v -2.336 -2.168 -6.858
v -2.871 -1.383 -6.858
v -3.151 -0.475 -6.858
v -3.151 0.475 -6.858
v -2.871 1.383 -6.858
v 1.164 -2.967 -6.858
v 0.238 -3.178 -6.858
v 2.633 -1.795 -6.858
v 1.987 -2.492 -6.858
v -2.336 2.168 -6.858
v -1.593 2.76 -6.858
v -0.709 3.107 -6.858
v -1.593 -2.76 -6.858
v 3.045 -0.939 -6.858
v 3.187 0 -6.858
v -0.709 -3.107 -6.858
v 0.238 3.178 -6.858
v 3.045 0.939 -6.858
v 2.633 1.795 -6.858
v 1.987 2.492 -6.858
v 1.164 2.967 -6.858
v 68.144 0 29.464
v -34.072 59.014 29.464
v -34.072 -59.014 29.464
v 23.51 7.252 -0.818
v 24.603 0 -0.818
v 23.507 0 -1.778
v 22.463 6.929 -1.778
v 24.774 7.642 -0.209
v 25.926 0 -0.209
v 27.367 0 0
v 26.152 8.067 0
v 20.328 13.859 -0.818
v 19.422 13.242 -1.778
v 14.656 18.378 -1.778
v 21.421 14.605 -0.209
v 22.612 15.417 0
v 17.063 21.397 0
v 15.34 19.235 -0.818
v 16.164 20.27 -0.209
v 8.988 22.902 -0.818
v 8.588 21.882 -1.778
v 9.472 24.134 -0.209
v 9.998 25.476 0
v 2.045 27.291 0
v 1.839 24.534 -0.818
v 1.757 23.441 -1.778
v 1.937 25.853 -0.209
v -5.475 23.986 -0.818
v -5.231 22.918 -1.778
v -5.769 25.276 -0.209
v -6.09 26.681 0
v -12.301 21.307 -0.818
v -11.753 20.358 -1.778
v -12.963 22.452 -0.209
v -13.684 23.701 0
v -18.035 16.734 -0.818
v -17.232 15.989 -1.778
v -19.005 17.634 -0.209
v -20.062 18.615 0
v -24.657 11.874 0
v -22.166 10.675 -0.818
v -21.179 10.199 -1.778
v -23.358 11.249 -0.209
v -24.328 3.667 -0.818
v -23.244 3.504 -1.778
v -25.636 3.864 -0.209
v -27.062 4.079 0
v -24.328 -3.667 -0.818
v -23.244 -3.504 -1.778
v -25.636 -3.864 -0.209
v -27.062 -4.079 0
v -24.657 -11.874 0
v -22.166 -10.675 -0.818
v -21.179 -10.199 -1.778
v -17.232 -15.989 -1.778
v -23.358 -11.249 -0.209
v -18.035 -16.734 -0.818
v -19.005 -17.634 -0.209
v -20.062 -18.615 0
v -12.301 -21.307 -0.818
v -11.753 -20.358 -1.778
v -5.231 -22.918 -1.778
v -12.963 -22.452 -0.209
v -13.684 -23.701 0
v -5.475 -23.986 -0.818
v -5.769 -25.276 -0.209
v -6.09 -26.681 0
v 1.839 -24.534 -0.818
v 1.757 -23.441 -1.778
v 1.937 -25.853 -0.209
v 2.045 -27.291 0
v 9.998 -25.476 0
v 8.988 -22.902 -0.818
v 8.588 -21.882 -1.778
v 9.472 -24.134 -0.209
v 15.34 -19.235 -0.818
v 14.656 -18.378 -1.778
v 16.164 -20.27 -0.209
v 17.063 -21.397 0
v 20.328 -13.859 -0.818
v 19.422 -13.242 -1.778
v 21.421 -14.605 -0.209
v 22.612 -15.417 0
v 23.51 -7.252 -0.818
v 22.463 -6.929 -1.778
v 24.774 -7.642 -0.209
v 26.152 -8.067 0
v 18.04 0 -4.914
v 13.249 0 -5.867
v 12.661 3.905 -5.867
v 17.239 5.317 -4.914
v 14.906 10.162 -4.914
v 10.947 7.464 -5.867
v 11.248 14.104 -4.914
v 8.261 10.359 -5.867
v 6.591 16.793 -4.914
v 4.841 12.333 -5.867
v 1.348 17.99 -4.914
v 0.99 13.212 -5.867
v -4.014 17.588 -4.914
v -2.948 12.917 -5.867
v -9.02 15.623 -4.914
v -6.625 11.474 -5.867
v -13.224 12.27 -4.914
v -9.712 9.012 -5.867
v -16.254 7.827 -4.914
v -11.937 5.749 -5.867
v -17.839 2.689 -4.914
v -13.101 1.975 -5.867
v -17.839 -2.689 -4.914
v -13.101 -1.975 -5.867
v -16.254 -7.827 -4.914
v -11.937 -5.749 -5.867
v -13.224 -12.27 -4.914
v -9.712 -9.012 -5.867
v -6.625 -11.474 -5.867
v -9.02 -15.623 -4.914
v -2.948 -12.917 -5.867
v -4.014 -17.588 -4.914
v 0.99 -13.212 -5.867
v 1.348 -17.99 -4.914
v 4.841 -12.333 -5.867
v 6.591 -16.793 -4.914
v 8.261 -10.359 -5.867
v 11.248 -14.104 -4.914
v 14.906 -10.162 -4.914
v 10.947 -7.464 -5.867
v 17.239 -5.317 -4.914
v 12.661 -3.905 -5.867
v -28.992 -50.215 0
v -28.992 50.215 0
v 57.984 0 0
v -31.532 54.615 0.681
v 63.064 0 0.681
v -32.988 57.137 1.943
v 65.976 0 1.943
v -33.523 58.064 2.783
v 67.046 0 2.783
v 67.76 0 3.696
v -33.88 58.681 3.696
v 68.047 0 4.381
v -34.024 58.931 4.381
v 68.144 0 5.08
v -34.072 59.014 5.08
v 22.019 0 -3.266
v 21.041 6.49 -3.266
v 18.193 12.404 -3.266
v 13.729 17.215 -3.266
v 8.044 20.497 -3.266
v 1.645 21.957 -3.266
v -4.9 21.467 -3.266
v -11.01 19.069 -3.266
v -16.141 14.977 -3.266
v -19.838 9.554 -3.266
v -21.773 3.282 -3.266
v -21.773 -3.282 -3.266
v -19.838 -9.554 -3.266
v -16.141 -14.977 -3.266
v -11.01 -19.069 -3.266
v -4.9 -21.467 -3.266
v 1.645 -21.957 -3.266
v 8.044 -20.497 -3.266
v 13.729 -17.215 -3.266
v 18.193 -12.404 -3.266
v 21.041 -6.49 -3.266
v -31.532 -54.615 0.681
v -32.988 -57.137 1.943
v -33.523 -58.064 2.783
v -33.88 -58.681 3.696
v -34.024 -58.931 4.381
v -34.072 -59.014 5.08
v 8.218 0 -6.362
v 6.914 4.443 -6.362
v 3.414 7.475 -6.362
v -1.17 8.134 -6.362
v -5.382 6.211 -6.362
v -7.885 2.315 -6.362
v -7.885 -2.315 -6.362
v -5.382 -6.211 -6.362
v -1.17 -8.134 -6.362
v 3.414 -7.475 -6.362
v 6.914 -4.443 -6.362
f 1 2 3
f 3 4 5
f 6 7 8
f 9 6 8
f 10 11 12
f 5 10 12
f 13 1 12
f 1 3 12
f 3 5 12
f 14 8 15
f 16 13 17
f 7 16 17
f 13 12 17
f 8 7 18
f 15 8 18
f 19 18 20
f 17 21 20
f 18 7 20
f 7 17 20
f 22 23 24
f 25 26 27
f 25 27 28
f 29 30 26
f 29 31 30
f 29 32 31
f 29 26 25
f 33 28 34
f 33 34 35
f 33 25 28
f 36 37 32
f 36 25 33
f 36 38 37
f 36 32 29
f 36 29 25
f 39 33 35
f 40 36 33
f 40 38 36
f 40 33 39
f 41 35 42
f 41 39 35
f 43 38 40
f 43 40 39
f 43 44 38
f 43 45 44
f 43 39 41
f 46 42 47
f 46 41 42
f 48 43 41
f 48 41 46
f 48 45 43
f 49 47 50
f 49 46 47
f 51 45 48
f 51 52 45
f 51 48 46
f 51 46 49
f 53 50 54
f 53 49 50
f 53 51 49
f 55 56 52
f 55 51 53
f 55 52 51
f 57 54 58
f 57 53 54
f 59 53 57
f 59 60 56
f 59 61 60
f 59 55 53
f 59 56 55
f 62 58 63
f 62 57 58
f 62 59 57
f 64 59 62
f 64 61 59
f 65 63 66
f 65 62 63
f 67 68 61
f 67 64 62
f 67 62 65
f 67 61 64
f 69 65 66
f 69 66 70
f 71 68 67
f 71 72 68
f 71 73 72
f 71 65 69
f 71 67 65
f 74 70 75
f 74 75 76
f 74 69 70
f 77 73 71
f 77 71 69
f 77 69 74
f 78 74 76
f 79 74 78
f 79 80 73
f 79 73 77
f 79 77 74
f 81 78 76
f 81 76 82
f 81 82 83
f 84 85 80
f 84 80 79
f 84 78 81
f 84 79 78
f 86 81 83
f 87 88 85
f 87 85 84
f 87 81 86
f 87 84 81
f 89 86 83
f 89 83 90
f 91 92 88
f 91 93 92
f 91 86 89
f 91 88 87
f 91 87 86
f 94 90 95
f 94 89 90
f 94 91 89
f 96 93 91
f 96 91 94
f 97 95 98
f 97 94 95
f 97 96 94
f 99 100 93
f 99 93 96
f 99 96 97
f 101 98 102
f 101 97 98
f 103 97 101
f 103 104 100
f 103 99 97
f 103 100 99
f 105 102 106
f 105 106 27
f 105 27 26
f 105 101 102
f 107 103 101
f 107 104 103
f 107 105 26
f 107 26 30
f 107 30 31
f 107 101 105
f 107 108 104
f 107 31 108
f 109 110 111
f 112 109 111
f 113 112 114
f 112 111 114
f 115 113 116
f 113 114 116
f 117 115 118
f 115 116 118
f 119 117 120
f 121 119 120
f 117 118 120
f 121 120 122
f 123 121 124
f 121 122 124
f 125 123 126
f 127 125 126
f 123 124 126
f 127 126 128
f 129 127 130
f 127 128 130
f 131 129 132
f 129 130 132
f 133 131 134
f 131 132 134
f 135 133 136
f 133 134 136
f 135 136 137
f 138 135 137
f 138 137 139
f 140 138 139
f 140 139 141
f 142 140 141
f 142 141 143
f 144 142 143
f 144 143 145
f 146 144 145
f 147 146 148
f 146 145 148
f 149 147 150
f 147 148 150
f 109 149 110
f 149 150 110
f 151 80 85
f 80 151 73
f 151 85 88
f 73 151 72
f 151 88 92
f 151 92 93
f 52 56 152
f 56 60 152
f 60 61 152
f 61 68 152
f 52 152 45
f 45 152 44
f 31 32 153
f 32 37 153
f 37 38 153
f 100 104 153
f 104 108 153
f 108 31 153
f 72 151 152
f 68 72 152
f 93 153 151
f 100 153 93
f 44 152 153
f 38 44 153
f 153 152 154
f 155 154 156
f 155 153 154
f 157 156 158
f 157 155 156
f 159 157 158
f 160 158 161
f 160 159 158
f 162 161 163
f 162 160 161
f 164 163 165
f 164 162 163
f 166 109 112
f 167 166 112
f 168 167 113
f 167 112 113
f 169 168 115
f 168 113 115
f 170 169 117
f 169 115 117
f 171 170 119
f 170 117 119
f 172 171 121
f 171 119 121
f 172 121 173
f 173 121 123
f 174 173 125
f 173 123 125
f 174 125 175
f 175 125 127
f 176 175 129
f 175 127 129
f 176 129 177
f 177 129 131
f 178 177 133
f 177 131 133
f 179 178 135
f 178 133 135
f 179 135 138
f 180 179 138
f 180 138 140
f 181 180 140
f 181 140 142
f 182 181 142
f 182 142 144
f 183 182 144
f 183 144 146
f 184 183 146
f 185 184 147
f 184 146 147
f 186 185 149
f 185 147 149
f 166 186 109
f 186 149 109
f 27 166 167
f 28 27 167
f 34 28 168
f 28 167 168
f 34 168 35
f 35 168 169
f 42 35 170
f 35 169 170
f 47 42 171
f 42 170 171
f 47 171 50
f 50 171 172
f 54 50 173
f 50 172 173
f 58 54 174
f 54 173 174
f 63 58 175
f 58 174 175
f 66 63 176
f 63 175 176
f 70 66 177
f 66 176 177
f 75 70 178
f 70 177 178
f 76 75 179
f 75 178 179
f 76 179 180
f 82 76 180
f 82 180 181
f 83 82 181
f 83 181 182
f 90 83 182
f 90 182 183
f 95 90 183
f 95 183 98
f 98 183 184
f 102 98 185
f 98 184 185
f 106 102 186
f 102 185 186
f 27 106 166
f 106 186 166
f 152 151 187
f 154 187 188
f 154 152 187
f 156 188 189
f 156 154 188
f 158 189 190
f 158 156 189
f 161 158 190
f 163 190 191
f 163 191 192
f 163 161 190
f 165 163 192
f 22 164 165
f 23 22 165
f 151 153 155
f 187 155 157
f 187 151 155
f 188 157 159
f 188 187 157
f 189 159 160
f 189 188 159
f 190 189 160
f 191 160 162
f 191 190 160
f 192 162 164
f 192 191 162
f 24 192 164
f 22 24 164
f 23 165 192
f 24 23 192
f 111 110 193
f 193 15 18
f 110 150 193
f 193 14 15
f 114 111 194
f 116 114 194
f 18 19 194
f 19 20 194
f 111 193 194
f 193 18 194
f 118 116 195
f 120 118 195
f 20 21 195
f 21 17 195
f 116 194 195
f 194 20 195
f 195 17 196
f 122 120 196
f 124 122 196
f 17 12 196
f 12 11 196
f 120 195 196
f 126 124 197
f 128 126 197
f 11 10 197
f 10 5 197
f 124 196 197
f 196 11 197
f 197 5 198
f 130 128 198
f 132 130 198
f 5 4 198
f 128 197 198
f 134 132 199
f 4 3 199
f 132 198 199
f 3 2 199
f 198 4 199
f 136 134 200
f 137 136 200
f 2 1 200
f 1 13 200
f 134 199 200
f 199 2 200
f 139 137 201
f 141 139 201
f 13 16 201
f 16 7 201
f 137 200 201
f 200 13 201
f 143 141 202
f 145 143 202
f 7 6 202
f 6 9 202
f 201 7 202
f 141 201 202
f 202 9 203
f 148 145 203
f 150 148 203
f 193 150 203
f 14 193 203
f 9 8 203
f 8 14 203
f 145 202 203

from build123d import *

# Parameters (mm, degrees)
F1_DEPTH    = 29.464
F2_R        = 23.506947033
F3_DEPTH    = 36.322
F4_SIZE     = 5.08
F5_T3_DEPTH = 143.4285494589
F5_T5_DEPTH = 137.562670724
F5_T7_DEPTH = 131.696791989
F6_SIZE     = 5.08
F7_SIZE     = 5.08
F8_SIZE     = 5.08


# Not quite as in the source:
# - a fillet or chamfer that OpenCascade refuses, or shapes differently, is made with other operations: its cross-section is extruded or revolved along the edge and cut away or added


with BuildPart() as f1:
    # F0 (on Top) → F1 (new body)
    with BuildSketch(Plane.XY):
        Polygon((-34.0719074011, 59.0142747295), (-34.0719074011, -59.0142747295), (68.1438148022, 0), align=None)
    extrude(amount=F1_DEPTH)

    # F2 (on face) → F3 (join)
    with BuildSketch(Plane.XY.offset(29.464)):
        Circle(F2_R)
    extrude(amount=-F3_DEPTH)

    # F4
    f4_edges = [f1.edges().sort_by_distance(p)[0] for p in [
        (-23.506947, 0, -6.858),
    ]]
    chamfer(f4_edges, length=F4_SIZE)

    # F5: fillet of radius 5.08 on 4 edges, made by hand

    # F5_s1 → F5_t2 (revolve)
    with BuildSketch(Plane.XZ):
        with BuildLine():
            ThreePointArc((23.506947033, -1.778), (25.2422963406, -0.4658608604), (27.367412808, 0))
            Line((27.367412808, 0), (23.506947033, 0))
            Line((23.506947033, 0), (23.506947033, -1.778))
        make_face()
    revolve(axis=Axis((0, 0, 0), (0, 0, 1)))

    # F5_s4 → F5_t3 (cut)
    with BuildSketch(Plane(origin=(62.1063837297, -35.8571373647, 0), x_dir=(0, 0, 1), z_dir=(-0.8660254038, 0.5, 0))):
        with BuildLine():
            ThreePointArc((0, 28.9919074011), (1.4878975516, 32.5840098495), (5.08, 34.0719074011))
            Line((5.08, 34.0719074011), (0, 34.0719074011))
            Line((0, 34.0719074011), (0, 28.9919074011))
        make_face()
    extrude(amount=F5_T3_DEPTH, mode=Mode.SUBTRACT)

    # F5_s6 → F5_t5 (cut)
    with BuildSketch(Plane(origin=(-62.1063837297, -35.8571373647, 0), x_dir=(0, 0, 1), z_dir=(0.8660254038, 0.5, 0))):
        with BuildLine():
            ThreePointArc((0, 28.9919074011), (1.4878975516, 32.5840098495), (5.08, 34.0719074011))
            Line((5.08, 34.0719074011), (0, 34.0719074011))
            Line((0, 34.0719074011), (0, 28.9919074011))
        make_face()
    extrude(amount=F5_T5_DEPTH, mode=Mode.SUBTRACT)

    # F5_s8 → F5_t7 (cut)
    with BuildSketch(Plane.XZ.offset(-65.8483959945)):
        with BuildLine():
            ThreePointArc((-28.9919074011, 0), (-32.5840098495, 1.4878975516), (-34.0719074011, 5.08))
            Line((-34.0719074011, 5.08), (-34.0719074011, 0))
            Line((-34.0719074011, 0), (-28.9919074011, 0))
        make_face()
    extrude(amount=F5_T7_DEPTH, mode=Mode.SUBTRACT)

    # F6
    f6_edges = [f1.edges().sort_by_distance(p)[0] for p in [
        (-18.426947, 0, -6.858),
    ]]
    chamfer(f6_edges, length=F6_SIZE)

    # F7
    f7_edges = [f1.edges().sort_by_distance(p)[0] for p in [
        (-13.346947, 0, -6.858),
    ]]
    chamfer(f7_edges, length=F7_SIZE)

    # F8
    f8_edges = [f1.edges().sort_by_distance(p)[0] for p in [
        (-8.266947, 0, -6.858),
    ]]
    chamfer(f8_edges, length=F8_SIZE)


solid = f1.part
